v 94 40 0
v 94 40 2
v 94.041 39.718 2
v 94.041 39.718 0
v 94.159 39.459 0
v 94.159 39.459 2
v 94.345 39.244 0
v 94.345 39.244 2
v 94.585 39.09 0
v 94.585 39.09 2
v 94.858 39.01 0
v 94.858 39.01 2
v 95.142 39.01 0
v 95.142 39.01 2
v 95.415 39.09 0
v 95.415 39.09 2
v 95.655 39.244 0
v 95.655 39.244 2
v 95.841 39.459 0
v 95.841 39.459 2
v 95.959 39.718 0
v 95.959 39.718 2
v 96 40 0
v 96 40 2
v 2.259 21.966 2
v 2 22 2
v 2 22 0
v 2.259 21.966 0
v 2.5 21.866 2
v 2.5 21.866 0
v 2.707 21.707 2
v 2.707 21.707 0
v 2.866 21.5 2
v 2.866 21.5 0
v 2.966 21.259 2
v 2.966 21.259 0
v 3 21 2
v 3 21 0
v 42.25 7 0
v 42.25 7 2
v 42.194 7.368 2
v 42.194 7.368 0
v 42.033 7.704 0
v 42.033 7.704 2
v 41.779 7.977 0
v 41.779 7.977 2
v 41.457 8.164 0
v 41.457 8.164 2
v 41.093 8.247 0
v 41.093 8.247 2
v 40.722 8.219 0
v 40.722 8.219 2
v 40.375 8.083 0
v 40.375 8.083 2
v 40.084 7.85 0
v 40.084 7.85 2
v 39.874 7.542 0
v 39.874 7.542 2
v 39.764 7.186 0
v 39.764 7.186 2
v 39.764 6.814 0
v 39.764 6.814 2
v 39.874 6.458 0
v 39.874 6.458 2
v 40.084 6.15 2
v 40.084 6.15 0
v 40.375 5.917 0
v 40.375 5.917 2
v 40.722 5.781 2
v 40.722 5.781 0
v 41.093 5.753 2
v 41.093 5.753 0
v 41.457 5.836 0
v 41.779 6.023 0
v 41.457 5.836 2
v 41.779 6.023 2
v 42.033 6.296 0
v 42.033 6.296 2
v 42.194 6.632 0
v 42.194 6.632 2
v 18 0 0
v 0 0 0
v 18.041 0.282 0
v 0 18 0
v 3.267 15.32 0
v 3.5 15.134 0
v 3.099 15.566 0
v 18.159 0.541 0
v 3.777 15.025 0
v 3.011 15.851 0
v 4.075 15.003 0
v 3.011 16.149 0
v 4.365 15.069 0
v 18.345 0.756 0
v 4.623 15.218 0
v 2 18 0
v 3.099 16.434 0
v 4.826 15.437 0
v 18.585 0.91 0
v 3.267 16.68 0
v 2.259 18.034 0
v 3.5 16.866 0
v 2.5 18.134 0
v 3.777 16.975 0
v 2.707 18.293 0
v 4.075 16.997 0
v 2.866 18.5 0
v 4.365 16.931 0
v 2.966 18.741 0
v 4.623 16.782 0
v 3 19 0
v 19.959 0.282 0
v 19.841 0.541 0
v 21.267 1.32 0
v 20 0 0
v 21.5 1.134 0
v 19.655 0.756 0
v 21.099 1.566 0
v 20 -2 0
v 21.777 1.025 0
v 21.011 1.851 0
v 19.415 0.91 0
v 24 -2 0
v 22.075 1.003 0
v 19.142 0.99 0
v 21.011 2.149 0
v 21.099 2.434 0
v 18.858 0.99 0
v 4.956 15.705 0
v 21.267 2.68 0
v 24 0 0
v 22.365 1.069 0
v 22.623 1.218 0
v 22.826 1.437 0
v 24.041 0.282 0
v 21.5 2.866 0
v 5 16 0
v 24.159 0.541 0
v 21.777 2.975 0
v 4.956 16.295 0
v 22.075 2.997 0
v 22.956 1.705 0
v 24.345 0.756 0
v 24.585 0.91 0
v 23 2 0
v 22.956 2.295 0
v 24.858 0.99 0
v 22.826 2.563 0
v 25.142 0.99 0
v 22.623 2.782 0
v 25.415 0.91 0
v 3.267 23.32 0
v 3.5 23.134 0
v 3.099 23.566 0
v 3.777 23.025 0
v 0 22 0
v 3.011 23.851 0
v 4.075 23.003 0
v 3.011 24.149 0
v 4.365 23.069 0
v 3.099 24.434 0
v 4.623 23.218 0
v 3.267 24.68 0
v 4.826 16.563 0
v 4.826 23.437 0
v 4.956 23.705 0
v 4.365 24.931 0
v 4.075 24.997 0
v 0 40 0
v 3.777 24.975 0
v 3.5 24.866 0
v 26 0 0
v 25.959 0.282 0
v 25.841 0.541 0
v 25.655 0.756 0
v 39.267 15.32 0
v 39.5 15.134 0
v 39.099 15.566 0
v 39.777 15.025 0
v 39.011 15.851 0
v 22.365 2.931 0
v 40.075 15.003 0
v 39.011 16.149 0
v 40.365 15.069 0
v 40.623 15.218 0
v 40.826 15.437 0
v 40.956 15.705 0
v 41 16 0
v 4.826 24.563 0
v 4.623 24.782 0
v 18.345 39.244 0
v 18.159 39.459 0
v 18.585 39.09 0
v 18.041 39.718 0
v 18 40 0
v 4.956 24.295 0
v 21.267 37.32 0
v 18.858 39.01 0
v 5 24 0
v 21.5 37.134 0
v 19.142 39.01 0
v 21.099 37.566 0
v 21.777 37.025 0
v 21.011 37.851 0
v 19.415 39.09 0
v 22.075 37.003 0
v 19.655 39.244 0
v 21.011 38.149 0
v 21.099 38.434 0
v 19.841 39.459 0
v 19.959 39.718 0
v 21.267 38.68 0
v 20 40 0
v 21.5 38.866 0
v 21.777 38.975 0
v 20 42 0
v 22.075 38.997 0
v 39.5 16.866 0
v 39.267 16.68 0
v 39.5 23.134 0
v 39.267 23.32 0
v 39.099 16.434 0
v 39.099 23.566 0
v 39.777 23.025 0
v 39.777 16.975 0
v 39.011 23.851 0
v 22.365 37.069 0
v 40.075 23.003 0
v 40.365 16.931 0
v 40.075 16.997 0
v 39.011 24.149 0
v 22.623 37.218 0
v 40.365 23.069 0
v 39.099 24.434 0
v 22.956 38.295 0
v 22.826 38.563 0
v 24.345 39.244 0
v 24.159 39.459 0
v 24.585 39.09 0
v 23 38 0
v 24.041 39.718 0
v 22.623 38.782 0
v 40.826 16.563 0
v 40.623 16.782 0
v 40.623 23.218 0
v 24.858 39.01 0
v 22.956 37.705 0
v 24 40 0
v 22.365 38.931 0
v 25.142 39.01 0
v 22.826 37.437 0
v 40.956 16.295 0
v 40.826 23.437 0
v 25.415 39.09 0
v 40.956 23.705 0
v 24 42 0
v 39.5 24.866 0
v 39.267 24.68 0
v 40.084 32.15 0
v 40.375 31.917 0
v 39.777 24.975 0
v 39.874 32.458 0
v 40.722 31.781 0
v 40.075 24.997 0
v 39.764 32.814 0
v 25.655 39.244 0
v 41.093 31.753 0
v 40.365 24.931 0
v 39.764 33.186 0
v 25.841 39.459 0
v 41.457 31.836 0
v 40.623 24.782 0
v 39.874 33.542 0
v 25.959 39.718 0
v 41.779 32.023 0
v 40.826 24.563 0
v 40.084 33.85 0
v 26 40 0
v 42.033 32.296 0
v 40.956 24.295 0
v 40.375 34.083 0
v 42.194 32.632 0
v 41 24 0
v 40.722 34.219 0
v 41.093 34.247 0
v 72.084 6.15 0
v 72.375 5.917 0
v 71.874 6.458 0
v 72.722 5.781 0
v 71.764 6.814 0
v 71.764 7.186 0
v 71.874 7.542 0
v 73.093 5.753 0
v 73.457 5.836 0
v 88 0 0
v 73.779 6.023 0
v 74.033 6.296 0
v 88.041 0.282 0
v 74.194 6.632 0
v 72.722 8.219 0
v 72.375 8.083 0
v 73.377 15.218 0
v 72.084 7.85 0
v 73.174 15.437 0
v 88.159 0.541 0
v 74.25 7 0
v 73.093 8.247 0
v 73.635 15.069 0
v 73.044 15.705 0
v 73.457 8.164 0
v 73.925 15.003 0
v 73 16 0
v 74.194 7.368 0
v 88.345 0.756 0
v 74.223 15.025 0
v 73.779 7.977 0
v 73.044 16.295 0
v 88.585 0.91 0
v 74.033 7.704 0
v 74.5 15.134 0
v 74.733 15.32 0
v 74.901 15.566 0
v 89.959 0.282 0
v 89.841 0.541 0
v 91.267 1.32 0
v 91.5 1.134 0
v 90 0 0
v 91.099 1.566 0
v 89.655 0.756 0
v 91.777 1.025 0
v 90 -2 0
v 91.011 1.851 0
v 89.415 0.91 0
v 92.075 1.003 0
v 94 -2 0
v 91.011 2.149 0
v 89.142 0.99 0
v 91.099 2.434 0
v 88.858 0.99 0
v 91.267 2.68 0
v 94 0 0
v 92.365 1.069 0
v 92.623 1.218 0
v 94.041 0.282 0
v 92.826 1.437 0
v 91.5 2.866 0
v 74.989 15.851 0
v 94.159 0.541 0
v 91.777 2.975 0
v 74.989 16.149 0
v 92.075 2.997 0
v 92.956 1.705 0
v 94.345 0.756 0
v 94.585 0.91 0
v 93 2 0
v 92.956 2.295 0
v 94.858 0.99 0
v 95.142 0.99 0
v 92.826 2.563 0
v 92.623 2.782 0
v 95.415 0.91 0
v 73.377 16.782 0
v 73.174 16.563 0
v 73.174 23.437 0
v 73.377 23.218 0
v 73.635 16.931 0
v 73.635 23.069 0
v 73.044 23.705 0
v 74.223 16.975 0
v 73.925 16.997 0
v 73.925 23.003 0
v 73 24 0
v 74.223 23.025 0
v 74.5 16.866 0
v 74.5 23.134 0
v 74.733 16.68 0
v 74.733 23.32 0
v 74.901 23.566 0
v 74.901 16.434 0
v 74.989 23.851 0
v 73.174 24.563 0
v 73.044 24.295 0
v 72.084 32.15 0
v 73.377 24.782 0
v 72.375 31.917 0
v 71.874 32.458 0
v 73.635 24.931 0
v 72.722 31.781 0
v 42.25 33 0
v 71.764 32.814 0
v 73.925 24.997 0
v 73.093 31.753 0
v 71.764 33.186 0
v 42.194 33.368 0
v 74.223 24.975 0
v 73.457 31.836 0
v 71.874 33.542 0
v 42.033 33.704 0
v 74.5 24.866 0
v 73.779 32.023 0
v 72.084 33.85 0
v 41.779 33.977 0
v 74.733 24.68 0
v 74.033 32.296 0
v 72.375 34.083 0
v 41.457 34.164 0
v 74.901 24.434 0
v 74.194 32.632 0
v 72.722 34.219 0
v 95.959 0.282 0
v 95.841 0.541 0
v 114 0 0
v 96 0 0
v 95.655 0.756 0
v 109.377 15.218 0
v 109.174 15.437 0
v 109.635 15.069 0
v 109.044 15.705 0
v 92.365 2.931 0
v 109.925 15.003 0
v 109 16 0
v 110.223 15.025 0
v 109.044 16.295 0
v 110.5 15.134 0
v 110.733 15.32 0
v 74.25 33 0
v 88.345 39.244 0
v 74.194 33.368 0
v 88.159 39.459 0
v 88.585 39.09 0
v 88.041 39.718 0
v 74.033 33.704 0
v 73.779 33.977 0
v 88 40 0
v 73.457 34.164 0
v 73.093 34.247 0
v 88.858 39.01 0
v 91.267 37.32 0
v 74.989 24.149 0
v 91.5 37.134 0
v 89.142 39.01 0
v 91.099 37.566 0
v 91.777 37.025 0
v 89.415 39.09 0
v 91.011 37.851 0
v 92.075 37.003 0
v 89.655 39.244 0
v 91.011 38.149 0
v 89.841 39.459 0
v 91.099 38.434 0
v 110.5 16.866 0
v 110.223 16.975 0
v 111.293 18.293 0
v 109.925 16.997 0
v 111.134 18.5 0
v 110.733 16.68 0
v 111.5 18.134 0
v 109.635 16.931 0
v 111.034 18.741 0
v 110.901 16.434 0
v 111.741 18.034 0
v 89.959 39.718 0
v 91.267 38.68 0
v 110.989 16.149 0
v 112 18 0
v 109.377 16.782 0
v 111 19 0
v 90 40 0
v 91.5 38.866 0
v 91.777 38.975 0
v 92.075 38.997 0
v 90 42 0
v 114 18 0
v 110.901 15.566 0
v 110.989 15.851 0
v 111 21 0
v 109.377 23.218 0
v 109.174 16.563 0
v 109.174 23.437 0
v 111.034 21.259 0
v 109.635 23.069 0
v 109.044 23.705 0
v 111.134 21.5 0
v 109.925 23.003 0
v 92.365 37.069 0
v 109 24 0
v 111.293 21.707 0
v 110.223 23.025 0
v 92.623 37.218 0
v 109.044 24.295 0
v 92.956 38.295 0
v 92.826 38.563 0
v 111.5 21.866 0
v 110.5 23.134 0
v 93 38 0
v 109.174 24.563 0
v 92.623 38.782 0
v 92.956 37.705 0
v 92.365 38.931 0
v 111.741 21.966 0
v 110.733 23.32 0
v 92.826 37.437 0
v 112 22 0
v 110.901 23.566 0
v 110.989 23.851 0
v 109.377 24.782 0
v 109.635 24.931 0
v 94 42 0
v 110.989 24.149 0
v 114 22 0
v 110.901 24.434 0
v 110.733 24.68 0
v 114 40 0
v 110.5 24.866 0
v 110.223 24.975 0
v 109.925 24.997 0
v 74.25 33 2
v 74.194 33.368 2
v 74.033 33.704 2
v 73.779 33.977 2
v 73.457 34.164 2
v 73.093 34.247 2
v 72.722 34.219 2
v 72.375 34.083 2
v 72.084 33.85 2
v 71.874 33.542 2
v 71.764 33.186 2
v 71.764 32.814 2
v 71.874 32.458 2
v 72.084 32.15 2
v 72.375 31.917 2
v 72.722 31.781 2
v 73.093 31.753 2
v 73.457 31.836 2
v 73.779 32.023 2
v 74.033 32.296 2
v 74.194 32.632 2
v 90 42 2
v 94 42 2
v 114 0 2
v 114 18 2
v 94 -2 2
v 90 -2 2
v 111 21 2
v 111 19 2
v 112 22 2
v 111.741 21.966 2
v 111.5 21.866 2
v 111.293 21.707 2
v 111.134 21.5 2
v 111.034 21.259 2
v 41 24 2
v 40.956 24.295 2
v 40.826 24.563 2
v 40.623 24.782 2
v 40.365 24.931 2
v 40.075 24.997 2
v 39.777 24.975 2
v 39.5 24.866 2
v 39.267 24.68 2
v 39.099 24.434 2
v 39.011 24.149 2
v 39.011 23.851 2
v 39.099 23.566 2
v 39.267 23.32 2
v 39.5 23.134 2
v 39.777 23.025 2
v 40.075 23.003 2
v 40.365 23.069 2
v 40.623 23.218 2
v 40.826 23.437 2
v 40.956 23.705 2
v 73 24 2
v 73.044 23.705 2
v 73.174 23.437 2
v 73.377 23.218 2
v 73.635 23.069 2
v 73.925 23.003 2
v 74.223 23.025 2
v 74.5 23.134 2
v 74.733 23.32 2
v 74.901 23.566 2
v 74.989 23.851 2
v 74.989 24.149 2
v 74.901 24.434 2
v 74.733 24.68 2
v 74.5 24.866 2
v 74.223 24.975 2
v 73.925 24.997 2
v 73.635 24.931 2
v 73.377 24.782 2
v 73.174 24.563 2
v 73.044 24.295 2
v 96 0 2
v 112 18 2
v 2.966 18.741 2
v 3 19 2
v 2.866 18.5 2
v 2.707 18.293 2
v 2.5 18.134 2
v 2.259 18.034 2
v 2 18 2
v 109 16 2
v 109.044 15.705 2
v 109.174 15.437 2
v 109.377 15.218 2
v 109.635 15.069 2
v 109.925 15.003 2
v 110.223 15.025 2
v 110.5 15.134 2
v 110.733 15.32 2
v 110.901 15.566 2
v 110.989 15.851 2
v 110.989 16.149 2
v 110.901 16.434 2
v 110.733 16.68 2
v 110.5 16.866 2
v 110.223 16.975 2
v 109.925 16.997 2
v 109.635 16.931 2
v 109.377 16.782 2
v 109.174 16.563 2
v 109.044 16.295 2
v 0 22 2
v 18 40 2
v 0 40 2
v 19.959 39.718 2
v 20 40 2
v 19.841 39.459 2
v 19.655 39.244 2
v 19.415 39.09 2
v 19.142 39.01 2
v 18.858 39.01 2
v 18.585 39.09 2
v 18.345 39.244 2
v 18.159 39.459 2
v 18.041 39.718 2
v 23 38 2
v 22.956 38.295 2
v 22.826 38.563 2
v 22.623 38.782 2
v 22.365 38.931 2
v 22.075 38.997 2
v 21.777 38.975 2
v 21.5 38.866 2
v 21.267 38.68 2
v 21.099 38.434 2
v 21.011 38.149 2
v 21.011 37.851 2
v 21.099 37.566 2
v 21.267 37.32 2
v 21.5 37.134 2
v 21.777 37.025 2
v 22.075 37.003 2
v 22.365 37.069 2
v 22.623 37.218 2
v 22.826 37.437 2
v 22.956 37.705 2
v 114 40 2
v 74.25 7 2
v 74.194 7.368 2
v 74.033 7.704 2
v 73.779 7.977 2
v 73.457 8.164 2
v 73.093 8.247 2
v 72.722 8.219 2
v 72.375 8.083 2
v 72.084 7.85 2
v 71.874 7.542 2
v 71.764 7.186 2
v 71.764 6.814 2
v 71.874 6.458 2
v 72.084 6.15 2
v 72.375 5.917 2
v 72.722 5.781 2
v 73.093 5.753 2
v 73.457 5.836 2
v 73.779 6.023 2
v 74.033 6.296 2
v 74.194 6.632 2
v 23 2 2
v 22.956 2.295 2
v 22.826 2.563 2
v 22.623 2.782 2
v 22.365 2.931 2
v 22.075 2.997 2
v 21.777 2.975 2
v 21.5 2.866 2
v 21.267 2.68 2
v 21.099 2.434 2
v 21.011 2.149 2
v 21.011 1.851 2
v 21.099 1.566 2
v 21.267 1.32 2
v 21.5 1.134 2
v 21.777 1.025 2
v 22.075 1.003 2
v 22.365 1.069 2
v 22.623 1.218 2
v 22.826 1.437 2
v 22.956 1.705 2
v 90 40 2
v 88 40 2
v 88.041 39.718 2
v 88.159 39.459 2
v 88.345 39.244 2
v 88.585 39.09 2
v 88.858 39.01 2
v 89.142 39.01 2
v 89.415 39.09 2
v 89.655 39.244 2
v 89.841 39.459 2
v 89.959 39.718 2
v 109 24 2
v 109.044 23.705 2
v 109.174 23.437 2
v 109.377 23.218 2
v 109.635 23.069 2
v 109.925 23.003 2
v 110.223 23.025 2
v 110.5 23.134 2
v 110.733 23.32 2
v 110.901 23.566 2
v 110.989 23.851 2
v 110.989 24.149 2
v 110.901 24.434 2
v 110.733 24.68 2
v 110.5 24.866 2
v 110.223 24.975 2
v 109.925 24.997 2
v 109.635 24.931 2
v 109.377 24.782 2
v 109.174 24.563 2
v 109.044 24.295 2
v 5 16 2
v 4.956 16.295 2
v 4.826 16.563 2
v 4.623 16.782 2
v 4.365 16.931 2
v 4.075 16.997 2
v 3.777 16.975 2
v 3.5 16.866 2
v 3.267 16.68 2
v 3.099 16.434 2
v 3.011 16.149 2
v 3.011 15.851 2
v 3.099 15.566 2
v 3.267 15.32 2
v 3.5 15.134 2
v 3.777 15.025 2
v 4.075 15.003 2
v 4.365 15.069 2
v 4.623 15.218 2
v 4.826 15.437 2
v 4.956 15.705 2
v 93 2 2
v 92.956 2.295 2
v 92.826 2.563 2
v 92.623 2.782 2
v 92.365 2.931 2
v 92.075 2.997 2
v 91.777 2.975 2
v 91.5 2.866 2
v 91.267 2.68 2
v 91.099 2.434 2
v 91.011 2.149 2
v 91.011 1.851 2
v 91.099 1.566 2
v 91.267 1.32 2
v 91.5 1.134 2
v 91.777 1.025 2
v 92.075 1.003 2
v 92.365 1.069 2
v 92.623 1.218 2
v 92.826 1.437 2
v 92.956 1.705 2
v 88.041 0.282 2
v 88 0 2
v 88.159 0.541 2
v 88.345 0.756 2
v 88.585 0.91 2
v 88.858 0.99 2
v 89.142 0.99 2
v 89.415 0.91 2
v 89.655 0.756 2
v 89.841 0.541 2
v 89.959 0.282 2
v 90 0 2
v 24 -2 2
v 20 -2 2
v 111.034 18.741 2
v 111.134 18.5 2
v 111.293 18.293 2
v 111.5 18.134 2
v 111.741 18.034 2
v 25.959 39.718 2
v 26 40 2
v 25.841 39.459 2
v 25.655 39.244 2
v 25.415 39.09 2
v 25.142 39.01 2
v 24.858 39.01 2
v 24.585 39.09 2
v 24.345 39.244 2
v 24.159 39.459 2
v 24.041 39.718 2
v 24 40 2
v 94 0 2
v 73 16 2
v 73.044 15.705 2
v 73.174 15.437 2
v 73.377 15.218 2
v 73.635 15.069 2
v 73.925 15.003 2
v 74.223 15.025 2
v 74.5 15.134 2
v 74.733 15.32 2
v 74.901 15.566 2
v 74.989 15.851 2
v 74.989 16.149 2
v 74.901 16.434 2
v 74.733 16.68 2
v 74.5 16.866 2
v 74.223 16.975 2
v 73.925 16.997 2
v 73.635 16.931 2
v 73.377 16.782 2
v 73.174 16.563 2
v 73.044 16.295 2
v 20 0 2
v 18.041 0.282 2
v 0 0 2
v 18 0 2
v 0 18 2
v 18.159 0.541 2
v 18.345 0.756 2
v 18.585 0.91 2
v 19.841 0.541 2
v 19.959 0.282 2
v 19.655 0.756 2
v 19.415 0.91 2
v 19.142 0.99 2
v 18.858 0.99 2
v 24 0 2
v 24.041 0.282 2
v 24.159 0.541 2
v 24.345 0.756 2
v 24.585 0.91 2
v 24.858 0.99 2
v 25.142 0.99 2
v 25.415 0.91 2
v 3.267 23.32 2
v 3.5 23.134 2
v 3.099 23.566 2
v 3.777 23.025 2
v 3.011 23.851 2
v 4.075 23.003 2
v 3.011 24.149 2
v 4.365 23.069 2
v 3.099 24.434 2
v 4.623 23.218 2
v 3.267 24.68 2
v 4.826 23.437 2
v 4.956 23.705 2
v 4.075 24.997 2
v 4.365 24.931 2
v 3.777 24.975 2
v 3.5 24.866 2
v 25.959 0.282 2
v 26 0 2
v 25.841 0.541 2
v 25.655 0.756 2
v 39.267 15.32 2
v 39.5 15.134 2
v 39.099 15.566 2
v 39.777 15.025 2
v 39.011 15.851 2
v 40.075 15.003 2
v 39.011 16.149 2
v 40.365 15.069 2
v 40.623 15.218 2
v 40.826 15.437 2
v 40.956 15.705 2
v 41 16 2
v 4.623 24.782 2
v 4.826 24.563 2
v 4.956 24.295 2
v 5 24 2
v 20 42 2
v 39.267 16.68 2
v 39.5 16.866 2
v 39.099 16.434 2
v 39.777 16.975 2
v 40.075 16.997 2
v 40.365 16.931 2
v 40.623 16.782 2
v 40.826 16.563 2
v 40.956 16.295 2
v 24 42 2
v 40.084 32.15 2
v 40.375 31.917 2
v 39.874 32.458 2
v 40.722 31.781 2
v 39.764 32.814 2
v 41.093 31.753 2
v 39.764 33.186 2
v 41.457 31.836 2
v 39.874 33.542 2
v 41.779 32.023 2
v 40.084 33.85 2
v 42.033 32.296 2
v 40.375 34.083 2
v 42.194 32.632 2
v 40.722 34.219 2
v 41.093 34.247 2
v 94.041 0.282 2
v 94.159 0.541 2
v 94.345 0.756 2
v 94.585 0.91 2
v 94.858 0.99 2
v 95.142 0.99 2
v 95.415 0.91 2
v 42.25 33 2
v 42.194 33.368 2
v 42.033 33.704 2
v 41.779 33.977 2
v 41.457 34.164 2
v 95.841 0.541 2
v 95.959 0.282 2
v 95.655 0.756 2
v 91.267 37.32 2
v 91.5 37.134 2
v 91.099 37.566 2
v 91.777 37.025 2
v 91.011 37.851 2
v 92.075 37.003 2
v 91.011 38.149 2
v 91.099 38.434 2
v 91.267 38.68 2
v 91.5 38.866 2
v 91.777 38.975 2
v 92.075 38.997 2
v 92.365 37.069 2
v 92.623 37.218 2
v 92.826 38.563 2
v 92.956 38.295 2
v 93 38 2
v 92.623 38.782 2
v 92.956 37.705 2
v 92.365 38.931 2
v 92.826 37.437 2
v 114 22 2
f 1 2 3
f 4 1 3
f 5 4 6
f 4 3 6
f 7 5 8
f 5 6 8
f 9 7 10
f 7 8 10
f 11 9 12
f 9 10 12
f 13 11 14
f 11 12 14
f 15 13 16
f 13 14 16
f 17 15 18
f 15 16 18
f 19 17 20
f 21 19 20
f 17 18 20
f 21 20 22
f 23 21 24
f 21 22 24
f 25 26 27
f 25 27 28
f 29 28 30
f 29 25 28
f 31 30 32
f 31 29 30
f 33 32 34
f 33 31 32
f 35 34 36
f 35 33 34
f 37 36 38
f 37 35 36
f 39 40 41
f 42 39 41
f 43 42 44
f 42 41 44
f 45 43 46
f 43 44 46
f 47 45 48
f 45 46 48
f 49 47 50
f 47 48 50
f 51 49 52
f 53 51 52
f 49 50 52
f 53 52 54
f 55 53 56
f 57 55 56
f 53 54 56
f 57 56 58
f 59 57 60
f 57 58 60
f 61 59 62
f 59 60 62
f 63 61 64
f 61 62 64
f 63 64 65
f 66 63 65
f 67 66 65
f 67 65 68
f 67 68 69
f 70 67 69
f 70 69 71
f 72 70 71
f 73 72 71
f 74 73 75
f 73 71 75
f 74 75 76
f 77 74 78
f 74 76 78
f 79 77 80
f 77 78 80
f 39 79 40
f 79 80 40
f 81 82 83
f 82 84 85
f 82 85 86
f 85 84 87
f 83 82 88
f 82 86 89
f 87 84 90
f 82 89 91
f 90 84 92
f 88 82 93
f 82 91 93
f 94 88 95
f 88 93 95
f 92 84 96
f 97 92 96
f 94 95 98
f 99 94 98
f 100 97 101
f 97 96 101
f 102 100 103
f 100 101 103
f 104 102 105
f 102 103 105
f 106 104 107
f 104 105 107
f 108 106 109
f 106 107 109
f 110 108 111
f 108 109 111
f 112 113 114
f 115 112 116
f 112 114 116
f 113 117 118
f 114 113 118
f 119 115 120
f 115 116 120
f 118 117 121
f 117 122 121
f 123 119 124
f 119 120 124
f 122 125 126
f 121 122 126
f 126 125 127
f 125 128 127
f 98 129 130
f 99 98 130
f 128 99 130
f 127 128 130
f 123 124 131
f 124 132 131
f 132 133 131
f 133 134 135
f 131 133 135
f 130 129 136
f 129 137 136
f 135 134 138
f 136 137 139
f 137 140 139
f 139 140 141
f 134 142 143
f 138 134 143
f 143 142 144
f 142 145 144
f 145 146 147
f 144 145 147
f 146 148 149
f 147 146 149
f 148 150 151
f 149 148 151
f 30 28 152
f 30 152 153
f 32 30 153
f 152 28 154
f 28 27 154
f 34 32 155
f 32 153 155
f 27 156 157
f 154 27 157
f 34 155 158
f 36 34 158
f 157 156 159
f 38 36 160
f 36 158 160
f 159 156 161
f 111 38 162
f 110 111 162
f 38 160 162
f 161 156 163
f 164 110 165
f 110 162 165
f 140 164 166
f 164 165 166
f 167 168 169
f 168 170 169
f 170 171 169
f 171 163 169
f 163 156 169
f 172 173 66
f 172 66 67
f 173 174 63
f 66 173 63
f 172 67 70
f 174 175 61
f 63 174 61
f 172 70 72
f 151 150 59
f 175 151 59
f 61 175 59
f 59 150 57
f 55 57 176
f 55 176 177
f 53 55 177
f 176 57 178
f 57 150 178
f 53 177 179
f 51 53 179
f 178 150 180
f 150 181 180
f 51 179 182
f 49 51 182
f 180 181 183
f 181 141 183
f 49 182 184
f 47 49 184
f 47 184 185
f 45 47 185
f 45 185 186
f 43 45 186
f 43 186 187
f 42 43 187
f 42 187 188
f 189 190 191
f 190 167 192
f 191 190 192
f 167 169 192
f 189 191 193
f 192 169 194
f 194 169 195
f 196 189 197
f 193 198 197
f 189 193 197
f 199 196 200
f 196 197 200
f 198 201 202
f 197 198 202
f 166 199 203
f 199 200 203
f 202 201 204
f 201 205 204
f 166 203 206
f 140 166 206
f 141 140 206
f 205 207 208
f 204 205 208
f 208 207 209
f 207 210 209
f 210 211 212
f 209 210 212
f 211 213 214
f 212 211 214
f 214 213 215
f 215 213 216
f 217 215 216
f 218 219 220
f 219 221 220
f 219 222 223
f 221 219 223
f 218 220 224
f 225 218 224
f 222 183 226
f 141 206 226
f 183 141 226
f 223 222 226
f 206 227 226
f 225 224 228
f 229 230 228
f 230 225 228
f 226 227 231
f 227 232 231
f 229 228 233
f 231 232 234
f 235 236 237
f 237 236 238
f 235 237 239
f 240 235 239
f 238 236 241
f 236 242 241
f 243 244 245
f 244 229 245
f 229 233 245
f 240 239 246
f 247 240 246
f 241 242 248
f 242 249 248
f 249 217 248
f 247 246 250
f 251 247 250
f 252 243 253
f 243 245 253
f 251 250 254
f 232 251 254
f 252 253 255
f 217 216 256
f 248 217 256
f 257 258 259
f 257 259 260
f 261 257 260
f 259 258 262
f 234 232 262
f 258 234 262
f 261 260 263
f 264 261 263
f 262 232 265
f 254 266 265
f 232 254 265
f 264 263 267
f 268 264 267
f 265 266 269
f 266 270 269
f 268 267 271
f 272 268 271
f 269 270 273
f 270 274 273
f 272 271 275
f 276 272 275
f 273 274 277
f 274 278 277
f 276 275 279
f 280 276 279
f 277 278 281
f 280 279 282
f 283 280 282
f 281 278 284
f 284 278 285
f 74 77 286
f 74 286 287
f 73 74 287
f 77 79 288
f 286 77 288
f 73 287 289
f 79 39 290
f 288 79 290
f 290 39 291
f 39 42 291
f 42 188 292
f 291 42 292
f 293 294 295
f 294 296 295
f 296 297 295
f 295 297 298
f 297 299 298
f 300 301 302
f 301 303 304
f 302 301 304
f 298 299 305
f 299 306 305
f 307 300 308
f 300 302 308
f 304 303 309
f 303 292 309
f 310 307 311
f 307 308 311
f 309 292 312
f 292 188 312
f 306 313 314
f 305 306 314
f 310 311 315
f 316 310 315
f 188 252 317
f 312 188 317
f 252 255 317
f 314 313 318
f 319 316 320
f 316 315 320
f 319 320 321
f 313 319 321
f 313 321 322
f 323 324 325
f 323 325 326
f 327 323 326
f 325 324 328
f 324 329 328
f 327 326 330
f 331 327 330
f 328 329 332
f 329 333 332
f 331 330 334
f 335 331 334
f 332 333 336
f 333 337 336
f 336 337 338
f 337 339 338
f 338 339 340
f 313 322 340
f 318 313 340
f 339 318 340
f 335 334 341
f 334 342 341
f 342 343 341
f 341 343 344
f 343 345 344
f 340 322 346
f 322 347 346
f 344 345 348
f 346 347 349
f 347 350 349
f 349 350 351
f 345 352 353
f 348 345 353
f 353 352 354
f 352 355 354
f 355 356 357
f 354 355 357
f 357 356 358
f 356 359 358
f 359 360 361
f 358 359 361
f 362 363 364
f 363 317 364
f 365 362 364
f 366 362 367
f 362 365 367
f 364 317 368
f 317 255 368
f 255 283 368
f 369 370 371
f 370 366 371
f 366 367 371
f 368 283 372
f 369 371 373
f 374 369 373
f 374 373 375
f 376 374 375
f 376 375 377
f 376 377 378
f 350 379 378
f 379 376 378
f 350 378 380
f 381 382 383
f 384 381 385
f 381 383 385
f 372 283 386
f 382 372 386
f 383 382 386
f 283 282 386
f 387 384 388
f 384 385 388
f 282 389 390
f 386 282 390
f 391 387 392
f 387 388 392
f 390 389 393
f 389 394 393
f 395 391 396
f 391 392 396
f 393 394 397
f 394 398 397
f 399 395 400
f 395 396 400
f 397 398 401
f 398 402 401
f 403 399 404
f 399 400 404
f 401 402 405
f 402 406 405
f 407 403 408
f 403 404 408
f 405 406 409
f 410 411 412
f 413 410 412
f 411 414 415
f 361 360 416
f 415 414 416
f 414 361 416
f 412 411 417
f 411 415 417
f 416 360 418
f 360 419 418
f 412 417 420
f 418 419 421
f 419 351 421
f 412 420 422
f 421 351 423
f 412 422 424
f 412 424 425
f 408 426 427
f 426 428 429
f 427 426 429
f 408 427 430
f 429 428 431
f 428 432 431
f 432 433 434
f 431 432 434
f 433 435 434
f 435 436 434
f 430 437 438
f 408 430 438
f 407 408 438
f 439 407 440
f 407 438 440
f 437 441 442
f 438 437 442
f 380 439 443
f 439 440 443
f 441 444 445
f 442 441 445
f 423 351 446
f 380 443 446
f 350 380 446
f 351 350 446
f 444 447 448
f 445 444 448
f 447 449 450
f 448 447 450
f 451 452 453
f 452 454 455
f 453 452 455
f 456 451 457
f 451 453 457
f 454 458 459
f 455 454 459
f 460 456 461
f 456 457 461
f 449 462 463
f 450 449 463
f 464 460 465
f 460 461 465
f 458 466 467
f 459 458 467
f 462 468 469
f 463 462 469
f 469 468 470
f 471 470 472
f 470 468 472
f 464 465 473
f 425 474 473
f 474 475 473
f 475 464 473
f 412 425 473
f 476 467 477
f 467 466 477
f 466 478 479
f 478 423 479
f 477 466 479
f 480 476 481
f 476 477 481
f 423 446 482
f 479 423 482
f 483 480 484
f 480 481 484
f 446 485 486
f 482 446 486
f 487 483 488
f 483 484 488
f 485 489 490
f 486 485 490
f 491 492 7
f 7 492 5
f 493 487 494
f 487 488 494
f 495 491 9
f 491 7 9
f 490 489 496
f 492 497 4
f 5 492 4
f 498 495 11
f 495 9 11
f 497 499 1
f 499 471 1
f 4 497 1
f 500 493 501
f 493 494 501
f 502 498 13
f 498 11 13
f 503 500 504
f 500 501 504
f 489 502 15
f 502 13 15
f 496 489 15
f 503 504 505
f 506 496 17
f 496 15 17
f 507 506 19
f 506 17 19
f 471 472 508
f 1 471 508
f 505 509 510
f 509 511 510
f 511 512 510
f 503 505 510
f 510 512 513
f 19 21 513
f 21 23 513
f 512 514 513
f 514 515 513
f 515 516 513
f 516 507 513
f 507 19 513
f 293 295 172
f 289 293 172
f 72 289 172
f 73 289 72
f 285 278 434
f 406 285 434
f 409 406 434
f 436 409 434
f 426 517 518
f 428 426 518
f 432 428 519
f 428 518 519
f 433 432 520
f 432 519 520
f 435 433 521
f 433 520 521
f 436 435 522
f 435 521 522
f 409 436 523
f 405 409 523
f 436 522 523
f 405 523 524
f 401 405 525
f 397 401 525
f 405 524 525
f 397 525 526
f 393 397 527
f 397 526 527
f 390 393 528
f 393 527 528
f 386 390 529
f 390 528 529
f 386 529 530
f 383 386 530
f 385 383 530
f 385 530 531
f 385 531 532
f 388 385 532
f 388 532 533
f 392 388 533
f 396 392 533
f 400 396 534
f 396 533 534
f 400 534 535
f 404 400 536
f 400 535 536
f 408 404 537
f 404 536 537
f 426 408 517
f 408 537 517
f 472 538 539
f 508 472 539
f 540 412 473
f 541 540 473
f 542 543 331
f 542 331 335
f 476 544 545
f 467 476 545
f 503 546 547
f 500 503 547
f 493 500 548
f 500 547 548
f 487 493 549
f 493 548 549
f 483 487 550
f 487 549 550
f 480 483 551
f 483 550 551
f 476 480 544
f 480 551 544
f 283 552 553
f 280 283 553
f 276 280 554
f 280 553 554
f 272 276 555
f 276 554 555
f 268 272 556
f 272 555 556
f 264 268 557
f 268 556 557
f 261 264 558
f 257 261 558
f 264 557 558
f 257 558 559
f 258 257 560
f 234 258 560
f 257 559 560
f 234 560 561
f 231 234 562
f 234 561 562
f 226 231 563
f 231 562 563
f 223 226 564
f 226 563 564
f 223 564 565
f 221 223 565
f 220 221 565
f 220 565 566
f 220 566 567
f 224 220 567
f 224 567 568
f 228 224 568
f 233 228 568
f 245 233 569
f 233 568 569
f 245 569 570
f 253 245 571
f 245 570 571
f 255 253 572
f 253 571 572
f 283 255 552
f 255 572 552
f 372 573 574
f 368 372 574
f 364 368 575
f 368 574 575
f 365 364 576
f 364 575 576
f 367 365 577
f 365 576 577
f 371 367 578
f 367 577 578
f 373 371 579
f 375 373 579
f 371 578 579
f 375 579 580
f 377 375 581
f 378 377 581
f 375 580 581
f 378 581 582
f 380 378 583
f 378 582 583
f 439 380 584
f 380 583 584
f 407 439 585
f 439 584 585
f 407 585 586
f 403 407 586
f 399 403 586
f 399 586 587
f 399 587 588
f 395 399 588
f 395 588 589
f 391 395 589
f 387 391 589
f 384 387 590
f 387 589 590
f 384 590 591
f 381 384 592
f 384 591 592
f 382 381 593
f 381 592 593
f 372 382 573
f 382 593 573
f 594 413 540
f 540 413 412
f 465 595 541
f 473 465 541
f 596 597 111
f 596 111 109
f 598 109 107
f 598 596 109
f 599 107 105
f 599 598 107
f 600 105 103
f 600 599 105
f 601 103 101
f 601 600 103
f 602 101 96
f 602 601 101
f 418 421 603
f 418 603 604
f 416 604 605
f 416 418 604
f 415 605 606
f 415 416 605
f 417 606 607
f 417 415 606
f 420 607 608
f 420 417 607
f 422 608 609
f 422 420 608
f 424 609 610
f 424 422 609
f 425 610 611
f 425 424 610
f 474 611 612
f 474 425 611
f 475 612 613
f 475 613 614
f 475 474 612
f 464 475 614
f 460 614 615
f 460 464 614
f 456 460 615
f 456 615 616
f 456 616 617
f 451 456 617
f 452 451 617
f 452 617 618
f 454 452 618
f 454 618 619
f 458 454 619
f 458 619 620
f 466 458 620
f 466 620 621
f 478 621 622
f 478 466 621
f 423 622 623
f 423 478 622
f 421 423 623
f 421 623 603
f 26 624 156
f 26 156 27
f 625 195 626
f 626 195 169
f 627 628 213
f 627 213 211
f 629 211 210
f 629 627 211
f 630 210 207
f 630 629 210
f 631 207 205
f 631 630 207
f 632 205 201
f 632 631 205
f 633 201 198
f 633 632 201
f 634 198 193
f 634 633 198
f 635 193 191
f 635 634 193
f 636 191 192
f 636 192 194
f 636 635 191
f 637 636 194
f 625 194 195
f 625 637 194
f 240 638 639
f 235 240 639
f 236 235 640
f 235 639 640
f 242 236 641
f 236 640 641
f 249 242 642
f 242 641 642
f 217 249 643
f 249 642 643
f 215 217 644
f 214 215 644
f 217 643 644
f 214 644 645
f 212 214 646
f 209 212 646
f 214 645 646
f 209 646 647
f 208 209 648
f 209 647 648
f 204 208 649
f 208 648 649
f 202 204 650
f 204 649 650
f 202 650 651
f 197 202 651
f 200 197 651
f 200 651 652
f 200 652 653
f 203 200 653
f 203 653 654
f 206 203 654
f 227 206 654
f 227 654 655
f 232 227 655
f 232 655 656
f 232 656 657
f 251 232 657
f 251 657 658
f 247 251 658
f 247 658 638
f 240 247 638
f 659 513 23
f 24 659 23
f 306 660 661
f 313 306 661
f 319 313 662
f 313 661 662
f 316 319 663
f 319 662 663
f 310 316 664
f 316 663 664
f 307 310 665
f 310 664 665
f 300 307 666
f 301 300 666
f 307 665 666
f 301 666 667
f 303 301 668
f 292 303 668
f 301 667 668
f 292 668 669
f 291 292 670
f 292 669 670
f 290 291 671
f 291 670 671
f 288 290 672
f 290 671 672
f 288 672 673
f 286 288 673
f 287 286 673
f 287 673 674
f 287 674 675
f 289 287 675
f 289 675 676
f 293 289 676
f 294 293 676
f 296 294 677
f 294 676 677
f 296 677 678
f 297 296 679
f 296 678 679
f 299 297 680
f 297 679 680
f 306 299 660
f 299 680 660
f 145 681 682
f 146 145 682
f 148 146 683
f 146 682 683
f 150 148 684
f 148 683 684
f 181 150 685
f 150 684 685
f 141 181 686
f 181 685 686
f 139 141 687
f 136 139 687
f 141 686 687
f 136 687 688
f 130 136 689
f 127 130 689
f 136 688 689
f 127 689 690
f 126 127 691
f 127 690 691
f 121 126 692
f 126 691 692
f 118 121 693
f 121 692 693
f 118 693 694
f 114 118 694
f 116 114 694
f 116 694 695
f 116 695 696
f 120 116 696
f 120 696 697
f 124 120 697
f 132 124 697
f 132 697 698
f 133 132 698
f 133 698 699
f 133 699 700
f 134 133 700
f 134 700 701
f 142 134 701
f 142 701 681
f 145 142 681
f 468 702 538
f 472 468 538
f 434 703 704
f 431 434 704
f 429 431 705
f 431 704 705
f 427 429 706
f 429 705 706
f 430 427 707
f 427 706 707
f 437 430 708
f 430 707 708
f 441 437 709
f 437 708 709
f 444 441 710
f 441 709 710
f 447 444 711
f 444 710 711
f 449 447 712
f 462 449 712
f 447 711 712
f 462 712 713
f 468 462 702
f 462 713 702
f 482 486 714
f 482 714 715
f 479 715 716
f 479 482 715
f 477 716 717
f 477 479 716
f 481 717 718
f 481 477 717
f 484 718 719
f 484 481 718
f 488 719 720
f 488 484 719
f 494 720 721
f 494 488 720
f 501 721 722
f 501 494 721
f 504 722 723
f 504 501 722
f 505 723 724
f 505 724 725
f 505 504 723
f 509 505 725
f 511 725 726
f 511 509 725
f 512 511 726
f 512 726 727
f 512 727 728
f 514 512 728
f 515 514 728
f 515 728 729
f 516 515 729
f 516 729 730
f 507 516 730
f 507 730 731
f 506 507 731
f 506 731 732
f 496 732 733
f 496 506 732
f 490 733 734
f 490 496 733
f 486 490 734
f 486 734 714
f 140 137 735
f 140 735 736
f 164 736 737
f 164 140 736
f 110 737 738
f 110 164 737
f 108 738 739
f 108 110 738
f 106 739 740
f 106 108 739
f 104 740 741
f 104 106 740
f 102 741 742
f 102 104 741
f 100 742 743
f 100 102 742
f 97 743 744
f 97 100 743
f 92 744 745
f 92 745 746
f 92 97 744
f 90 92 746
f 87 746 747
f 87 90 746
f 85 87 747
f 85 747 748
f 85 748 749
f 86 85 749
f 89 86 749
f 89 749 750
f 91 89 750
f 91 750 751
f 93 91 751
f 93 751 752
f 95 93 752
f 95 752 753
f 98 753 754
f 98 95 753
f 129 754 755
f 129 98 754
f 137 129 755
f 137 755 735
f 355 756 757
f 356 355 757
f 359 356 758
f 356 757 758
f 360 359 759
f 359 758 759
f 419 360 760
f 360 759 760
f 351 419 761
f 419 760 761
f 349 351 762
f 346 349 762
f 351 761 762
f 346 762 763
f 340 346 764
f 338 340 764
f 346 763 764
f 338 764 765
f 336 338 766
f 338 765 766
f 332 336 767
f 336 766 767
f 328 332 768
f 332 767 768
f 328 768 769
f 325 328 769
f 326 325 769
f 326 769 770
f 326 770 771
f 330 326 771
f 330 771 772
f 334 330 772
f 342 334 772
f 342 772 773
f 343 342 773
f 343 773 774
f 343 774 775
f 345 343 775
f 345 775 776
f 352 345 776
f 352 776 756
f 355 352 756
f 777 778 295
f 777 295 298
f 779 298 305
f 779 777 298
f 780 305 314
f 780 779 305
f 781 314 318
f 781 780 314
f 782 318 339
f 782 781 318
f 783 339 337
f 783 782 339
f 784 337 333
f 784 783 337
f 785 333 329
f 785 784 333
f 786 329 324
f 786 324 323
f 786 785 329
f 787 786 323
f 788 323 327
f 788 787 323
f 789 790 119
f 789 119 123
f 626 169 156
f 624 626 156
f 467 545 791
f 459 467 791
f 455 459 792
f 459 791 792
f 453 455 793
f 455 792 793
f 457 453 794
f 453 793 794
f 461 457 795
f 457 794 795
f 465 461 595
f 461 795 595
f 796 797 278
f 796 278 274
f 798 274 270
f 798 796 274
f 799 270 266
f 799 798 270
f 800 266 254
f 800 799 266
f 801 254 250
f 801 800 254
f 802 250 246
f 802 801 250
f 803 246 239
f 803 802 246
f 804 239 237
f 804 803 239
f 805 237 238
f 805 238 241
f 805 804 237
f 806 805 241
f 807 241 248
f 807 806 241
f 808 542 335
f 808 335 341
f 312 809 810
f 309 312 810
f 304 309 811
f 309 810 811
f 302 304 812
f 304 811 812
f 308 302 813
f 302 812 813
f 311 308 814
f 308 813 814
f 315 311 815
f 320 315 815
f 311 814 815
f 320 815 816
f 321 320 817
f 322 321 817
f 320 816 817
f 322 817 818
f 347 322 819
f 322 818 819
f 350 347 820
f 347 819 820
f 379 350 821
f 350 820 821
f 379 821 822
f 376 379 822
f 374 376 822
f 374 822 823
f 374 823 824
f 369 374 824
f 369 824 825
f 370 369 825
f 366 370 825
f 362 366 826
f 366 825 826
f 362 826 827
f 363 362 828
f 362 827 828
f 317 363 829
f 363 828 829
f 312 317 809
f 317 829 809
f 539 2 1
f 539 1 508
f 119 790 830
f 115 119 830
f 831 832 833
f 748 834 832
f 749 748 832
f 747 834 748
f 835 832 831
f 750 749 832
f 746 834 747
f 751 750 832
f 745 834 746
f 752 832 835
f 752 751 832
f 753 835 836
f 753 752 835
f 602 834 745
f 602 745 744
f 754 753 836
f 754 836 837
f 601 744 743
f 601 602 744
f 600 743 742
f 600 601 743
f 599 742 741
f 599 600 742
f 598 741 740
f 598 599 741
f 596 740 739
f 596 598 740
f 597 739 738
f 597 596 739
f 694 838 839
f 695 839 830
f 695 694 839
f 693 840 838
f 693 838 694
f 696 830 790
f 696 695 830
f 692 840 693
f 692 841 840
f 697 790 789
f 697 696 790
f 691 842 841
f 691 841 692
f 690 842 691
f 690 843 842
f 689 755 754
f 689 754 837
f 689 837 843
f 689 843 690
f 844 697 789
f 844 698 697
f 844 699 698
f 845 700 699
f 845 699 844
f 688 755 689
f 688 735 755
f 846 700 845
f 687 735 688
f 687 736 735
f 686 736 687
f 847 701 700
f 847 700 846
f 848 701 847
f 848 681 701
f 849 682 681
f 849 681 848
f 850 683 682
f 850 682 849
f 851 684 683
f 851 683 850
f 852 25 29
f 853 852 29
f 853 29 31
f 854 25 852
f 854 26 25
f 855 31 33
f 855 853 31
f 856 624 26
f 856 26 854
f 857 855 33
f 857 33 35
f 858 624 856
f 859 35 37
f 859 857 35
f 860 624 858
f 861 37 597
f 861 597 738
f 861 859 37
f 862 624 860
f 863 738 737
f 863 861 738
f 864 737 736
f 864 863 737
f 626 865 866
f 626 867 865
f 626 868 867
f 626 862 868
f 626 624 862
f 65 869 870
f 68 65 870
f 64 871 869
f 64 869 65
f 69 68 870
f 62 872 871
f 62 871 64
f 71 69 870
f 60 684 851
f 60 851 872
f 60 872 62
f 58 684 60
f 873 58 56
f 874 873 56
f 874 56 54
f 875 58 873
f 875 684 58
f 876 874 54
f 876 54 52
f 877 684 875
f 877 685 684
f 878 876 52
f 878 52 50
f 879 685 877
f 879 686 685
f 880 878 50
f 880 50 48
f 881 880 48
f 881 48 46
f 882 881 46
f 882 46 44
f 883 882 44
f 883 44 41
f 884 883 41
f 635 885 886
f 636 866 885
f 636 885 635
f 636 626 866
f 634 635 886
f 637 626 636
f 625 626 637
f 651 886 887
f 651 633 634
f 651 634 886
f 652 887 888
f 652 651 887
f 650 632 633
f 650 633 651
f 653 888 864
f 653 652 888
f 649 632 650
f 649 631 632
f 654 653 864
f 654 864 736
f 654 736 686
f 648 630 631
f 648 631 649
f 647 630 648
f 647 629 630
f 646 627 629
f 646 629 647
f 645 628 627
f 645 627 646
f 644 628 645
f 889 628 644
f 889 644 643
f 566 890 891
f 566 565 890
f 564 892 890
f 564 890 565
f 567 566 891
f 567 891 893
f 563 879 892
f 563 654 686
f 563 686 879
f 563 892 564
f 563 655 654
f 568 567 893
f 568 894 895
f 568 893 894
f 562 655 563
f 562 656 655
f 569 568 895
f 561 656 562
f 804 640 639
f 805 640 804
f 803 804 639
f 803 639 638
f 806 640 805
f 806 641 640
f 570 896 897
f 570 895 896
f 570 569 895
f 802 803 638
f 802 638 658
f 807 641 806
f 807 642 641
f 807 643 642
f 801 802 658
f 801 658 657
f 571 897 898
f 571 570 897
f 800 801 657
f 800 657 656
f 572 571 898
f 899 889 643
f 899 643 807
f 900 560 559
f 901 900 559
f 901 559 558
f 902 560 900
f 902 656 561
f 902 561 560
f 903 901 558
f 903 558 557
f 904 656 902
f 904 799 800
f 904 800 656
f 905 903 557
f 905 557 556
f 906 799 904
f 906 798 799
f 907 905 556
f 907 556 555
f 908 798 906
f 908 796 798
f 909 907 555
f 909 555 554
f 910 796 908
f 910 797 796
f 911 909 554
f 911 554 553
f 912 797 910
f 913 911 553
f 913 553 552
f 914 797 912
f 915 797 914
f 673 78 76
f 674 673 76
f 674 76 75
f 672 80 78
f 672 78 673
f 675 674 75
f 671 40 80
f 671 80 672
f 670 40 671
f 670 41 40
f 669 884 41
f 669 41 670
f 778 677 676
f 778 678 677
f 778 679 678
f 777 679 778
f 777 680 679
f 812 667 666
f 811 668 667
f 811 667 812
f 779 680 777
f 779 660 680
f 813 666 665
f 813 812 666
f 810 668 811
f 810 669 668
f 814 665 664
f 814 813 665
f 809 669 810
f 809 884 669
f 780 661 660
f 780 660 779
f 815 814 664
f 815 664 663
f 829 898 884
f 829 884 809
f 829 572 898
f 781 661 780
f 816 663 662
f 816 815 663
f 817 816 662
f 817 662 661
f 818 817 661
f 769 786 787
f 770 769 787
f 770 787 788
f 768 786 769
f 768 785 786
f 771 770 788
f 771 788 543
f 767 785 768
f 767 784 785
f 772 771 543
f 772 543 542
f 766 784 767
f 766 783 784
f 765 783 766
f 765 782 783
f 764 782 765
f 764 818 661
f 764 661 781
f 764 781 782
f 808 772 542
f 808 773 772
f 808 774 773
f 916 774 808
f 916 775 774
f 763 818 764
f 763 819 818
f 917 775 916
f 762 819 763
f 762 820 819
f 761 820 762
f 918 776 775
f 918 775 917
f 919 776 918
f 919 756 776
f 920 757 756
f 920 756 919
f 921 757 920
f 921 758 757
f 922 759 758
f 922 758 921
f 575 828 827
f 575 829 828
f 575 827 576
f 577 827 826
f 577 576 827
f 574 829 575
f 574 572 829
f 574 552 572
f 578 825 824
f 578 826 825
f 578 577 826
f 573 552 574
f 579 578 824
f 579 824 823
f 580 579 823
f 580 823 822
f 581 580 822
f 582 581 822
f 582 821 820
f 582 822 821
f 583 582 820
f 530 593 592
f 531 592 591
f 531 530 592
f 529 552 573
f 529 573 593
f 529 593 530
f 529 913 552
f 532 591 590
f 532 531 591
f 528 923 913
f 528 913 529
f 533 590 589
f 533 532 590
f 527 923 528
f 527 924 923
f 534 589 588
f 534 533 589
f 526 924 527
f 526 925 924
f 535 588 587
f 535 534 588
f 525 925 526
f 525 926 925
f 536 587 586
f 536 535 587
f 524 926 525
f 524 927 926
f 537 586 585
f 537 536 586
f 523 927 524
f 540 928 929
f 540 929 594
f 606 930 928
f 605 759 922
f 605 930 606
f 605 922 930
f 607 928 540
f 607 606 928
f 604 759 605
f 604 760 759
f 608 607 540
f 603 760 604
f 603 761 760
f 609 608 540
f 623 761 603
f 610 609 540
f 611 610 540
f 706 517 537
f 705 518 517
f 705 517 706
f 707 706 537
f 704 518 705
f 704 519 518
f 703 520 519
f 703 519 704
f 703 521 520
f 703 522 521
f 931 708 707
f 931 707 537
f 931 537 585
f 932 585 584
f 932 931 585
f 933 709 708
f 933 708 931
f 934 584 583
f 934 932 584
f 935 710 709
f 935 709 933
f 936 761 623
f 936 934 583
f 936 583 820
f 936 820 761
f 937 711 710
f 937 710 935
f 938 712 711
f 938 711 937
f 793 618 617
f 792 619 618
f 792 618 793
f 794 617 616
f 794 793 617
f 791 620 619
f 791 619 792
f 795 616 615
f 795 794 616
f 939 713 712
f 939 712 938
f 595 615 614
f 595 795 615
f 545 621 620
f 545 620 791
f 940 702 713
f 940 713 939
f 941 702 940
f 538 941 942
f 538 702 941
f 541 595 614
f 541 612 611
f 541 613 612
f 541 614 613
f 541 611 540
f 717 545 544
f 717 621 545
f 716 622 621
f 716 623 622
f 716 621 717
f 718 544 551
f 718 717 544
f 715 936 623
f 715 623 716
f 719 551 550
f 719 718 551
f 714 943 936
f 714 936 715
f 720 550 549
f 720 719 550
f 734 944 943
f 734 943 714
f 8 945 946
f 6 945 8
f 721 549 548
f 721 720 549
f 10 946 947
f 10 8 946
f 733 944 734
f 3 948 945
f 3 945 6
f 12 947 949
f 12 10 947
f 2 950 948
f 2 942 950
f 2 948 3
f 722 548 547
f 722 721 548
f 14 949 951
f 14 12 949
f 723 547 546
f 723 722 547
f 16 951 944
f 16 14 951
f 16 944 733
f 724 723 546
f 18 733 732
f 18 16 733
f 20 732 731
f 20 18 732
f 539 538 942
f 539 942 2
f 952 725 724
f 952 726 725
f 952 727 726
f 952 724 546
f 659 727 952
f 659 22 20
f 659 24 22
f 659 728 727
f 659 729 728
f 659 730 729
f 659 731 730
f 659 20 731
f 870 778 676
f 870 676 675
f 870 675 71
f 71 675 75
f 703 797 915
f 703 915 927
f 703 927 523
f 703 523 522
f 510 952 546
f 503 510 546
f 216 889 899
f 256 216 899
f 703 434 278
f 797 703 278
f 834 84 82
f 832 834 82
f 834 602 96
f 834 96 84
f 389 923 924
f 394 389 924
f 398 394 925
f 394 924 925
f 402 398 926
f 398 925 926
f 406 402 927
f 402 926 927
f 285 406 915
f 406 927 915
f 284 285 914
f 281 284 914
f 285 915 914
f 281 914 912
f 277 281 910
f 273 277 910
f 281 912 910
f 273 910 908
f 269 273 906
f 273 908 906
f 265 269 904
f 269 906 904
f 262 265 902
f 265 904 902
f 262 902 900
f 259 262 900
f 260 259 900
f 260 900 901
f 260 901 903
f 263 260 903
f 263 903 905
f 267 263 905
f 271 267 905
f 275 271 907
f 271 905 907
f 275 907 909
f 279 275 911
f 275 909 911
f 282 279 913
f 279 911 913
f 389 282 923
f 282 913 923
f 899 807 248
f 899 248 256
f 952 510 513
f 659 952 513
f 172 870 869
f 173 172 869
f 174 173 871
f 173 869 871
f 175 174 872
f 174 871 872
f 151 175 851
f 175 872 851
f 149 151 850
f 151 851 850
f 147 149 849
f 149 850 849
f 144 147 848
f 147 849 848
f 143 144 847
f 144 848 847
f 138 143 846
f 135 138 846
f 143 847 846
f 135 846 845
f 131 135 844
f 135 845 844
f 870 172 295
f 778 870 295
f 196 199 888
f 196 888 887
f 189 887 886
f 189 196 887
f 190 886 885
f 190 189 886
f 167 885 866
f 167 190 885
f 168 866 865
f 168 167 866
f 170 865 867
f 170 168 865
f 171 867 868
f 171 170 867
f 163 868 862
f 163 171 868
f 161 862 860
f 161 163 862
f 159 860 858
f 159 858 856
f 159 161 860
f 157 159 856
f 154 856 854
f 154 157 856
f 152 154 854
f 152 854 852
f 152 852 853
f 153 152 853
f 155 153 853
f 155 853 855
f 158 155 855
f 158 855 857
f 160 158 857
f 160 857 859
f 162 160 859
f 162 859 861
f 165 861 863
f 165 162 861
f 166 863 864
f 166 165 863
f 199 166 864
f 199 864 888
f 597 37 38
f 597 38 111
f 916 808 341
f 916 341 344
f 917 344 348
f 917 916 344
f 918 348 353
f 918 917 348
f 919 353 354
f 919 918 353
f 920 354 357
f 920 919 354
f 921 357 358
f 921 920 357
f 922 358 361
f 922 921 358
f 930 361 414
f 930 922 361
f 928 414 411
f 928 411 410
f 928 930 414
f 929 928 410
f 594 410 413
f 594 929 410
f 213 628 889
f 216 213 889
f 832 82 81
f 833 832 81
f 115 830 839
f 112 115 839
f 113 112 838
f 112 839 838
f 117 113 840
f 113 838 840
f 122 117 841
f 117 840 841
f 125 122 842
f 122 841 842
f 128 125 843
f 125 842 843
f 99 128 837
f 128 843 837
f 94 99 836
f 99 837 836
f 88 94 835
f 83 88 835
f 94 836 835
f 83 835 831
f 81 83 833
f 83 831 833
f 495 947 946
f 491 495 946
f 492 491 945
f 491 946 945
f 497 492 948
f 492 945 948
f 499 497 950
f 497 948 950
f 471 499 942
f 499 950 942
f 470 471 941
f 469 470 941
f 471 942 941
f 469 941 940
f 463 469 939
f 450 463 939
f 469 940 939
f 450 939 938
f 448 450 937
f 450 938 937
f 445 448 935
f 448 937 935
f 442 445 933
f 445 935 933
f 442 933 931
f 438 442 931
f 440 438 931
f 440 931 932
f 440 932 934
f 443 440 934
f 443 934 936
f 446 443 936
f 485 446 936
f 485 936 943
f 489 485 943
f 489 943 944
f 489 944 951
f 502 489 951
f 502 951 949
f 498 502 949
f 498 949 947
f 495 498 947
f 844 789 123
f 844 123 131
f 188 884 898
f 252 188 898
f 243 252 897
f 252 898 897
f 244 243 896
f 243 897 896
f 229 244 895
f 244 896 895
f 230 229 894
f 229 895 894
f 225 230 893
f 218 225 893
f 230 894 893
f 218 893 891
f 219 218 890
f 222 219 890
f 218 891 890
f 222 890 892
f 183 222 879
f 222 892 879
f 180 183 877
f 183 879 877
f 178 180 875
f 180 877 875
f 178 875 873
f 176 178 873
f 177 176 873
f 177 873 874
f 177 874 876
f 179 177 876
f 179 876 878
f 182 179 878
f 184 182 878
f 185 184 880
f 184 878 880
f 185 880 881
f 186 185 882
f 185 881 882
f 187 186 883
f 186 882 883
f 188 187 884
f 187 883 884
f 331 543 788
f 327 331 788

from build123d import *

# Parameters (mm, degrees)
SKETCH_3_R          = 1
EXTRUDE_3_DEPTH     = 2
SKETCH_4_R          = 1
CUT_EXTRUDE_2_DEPTH = 2
SKETCH_6_R          = 1.25
CUT_EXTRUDE_6_DEPTH = 2
SKETCH_7_R          = 1
CUT_EXTRUDE_7_DEPTH = 10
SKETCH_8_W          = 4
SKETCH_8_H          = 2
EXTRUDE_6_DEPTH     = 2
CUT_EXTRUDE_8_DEPTH = 2


with BuildPart() as part:
    # 草圖3 → 填料-伸長3 (new body)
    with BuildSketch(Plane.XY):
        Polygon((1, 40), (0, 40), (0, 39), (0, 1), (0, 0), (1, 0), (113, 0), (114, 0), (114, 1), (114, 39), (114, 40), (113, 40), align=None)
        with Locations((4, 24)):
            Circle(SKETCH_3_R, mode=Mode.SUBTRACT)
        with Locations((4, 16)):
            Circle(SKETCH_3_R, mode=Mode.SUBTRACT)
        with Locations(Location((110, 16, 0), (0, 0, 180))):
            Circle(SKETCH_3_R, mode=Mode.SUBTRACT)
        with Locations(Location((110, 24, 0), (0, 0, 180))):
            Circle(SKETCH_3_R, mode=Mode.SUBTRACT)
    extrude(amount=EXTRUDE_3_DEPTH)

    # 草圖4 → 除料-伸長2 (cut)
    with BuildSketch(Plane.XY.offset(2)):
        with Locations((40, 24)):
            Circle(SKETCH_4_R)
        with Locations((40, 16)):
            Circle(SKETCH_4_R)
        with Locations(Location((74, 16, 0), (0, 0, 180))):
            Circle(SKETCH_4_R)
        with Locations(Location((74, 24, 0), (0, 0, 180))):
            Circle(SKETCH_4_R)
    extrude(amount=-CUT_EXTRUDE_2_DEPTH, mode=Mode.SUBTRACT)

    # 草圖6 → 除料-伸長6 (cut)
    with BuildSketch(Plane.XY.offset(2)):
        with Locations((41, 33)):
            Circle(SKETCH_6_R)
        with Locations((73, 33)):
            Circle(SKETCH_6_R)
        with Locations((73, 7)):
            Circle(SKETCH_6_R)
        with Locations((41, 7)):
            Circle(SKETCH_6_R)
    extrude(amount=-CUT_EXTRUDE_6_DEPTH, mode=Mode.SUBTRACT)

    # 草圖7 → 除料-伸長7 (cut)
    with BuildSketch(Plane.XY.offset(2)):
        with Locations((22, 38)):
            Circle(SKETCH_7_R)
        with Locations((92, 38)):
            Circle(SKETCH_7_R)
        with Locations((92, 2)):
            Circle(SKETCH_7_R)
        with Locations((22, 2)):
            Circle(SKETCH_7_R)
    extrude(amount=-CUT_EXTRUDE_7_DEPTH, mode=Mode.SUBTRACT)

    # 草圖8 → 填料-伸長6 (add)
    with BuildSketch(Plane.XY.offset(2)):
        with Locations((22, 41)):
            Rectangle(SKETCH_8_W, SKETCH_8_H)
        with Locations((22, -1)):
            Rectangle(SKETCH_8_W, SKETCH_8_H)
        with Locations((92, -1)):
            Rectangle(SKETCH_8_W, SKETCH_8_H)
        with Locations((92, 41)):
            Rectangle(SKETCH_8_W, SKETCH_8_H)
    extrude(amount=-EXTRUDE_6_DEPTH)

    # 草圖9 → 除料-伸長8 (cut)
    with BuildSketch(Plane.XY.offset(2)):
        with BuildLine():
            Line((0, 22), (2, 22))
            ThreePointArc((2, 22), (2.707106781, 21.707106781), (3, 21))
            Line((3, 21), (3, 19))
            ThreePointArc((3, 19), (2.707106781, 18.292893219), (2, 18))
            Line((2, 18), (0, 18))
            Line((0, 18), (0, 22))
        make_face()
        with BuildLine():
            Line((18, 40), (20, 40))
            ThreePointArc((20, 40), (19, 39), (18, 40))
        make_face()
        with BuildLine():
            Line((24, 40), (26, 40))
            ThreePointArc((26, 40), (25, 39), (24, 40))
        make_face()
        with BuildLine():
            Line((18, 0), (20, 0))
            ThreePointArc((20, 0), (19, 1), (18, 0))
        make_face()
        with BuildLine():
            Line((24, 0), (26, 0))
            ThreePointArc((26, 0), (25, 1), (24, 0))
        make_face()
        with BuildLine():
            Line((90, 0), (88, 0))
            ThreePointArc((88, 0), (89, 1), (90, 0))
        make_face()
        with BuildLine():
            Line((96, 0), (94, 0))
            ThreePointArc((94, 0), (95, 1), (96, 0))
        make_face()
        with BuildLine():
            Line((90, 40), (88, 40))
            ThreePointArc((88, 40), (89, 39), (90, 40))
        make_face()
        with BuildLine():
            Line((111, 21), (111, 19))
            ThreePointArc((111, 19), (111.292893219, 18.292893219), (112, 18))
            Line((112, 18), (114, 18))
            Line((114, 18), (114, 22))
            Line((114, 22), (112, 22))
            ThreePointArc((112, 22), (111.292893219, 21.707106781), (111, 21))
        make_face()
        with BuildLine():
            Line((96, 40), (94, 40))
            ThreePointArc((94, 40), (95, 39), (96, 40))
        make_face()
    extrude(amount=-CUT_EXTRUDE_8_DEPTH, mode=Mode.SUBTRACT)


solid = part.part
